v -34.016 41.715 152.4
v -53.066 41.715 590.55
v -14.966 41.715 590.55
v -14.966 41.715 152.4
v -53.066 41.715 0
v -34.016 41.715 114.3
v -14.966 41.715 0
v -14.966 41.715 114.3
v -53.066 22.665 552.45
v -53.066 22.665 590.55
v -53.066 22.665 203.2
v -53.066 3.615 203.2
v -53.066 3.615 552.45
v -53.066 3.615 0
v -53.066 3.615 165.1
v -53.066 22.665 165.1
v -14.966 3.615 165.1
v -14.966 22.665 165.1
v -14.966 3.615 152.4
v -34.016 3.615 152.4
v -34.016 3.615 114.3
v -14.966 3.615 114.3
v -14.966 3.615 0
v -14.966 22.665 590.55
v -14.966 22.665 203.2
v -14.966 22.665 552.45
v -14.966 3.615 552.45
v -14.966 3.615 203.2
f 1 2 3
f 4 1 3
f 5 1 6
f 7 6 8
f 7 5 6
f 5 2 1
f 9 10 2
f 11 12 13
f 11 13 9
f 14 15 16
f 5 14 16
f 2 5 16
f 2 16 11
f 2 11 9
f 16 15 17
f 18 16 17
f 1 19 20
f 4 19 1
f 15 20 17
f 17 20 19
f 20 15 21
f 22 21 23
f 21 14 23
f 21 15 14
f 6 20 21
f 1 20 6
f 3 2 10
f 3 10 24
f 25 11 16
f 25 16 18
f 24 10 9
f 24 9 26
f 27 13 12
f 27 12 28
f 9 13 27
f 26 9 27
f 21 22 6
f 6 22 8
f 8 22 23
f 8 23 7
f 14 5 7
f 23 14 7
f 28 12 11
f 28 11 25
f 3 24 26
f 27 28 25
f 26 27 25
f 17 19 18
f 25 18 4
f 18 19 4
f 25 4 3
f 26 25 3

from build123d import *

# Parameters (mm, degrees)
F0_W     = 38.1
F0_H     = 38.1
F1_DEPTH = 590.55
F2_W     = 38.1
F2_H     = 38.1
F3_DEPTH = 19.05
F4_W     = 38.1
F4_H     = 38.1
F5_DEPTH = 19.05
F6_W     = 38.1
F6_H     = 38.1
F7_DEPTH = 19.05


with BuildPart() as f1:
    # F0 (on Top) → F1 (new body)
    with BuildSketch(Plane.XY):
        with Locations((-34.016462, 22.66462)):
            Rectangle(F0_W, F0_H)
    extrude(amount=F1_DEPTH)

    # F2 (on face) → F3 (cut)
    with BuildSketch(Plane.XZ.offset(-3.61462)):
        with Locations((-34.016462, 571.5)):
            Rectangle(F2_W, F2_H)
    extrude(amount=-F3_DEPTH, mode=Mode.SUBTRACT)

    # F4 (on face) → F5 (cut)
    with BuildSketch(Plane.YZ.offset(-14.966462)):
        with Locations((22.66462, 133.35)):
            Rectangle(F4_W, F4_H)
    extrude(amount=-F5_DEPTH, mode=Mode.SUBTRACT)

    # F6 (on face) → F7 (cut)
    with BuildSketch(Plane.XZ.offset(-3.61462)):
        with Locations((-34.016462, 184.15)):
            Rectangle(F6_W, F6_H)
    extrude(amount=-F7_DEPTH, mode=Mode.SUBTRACT)


solid = f1.part
